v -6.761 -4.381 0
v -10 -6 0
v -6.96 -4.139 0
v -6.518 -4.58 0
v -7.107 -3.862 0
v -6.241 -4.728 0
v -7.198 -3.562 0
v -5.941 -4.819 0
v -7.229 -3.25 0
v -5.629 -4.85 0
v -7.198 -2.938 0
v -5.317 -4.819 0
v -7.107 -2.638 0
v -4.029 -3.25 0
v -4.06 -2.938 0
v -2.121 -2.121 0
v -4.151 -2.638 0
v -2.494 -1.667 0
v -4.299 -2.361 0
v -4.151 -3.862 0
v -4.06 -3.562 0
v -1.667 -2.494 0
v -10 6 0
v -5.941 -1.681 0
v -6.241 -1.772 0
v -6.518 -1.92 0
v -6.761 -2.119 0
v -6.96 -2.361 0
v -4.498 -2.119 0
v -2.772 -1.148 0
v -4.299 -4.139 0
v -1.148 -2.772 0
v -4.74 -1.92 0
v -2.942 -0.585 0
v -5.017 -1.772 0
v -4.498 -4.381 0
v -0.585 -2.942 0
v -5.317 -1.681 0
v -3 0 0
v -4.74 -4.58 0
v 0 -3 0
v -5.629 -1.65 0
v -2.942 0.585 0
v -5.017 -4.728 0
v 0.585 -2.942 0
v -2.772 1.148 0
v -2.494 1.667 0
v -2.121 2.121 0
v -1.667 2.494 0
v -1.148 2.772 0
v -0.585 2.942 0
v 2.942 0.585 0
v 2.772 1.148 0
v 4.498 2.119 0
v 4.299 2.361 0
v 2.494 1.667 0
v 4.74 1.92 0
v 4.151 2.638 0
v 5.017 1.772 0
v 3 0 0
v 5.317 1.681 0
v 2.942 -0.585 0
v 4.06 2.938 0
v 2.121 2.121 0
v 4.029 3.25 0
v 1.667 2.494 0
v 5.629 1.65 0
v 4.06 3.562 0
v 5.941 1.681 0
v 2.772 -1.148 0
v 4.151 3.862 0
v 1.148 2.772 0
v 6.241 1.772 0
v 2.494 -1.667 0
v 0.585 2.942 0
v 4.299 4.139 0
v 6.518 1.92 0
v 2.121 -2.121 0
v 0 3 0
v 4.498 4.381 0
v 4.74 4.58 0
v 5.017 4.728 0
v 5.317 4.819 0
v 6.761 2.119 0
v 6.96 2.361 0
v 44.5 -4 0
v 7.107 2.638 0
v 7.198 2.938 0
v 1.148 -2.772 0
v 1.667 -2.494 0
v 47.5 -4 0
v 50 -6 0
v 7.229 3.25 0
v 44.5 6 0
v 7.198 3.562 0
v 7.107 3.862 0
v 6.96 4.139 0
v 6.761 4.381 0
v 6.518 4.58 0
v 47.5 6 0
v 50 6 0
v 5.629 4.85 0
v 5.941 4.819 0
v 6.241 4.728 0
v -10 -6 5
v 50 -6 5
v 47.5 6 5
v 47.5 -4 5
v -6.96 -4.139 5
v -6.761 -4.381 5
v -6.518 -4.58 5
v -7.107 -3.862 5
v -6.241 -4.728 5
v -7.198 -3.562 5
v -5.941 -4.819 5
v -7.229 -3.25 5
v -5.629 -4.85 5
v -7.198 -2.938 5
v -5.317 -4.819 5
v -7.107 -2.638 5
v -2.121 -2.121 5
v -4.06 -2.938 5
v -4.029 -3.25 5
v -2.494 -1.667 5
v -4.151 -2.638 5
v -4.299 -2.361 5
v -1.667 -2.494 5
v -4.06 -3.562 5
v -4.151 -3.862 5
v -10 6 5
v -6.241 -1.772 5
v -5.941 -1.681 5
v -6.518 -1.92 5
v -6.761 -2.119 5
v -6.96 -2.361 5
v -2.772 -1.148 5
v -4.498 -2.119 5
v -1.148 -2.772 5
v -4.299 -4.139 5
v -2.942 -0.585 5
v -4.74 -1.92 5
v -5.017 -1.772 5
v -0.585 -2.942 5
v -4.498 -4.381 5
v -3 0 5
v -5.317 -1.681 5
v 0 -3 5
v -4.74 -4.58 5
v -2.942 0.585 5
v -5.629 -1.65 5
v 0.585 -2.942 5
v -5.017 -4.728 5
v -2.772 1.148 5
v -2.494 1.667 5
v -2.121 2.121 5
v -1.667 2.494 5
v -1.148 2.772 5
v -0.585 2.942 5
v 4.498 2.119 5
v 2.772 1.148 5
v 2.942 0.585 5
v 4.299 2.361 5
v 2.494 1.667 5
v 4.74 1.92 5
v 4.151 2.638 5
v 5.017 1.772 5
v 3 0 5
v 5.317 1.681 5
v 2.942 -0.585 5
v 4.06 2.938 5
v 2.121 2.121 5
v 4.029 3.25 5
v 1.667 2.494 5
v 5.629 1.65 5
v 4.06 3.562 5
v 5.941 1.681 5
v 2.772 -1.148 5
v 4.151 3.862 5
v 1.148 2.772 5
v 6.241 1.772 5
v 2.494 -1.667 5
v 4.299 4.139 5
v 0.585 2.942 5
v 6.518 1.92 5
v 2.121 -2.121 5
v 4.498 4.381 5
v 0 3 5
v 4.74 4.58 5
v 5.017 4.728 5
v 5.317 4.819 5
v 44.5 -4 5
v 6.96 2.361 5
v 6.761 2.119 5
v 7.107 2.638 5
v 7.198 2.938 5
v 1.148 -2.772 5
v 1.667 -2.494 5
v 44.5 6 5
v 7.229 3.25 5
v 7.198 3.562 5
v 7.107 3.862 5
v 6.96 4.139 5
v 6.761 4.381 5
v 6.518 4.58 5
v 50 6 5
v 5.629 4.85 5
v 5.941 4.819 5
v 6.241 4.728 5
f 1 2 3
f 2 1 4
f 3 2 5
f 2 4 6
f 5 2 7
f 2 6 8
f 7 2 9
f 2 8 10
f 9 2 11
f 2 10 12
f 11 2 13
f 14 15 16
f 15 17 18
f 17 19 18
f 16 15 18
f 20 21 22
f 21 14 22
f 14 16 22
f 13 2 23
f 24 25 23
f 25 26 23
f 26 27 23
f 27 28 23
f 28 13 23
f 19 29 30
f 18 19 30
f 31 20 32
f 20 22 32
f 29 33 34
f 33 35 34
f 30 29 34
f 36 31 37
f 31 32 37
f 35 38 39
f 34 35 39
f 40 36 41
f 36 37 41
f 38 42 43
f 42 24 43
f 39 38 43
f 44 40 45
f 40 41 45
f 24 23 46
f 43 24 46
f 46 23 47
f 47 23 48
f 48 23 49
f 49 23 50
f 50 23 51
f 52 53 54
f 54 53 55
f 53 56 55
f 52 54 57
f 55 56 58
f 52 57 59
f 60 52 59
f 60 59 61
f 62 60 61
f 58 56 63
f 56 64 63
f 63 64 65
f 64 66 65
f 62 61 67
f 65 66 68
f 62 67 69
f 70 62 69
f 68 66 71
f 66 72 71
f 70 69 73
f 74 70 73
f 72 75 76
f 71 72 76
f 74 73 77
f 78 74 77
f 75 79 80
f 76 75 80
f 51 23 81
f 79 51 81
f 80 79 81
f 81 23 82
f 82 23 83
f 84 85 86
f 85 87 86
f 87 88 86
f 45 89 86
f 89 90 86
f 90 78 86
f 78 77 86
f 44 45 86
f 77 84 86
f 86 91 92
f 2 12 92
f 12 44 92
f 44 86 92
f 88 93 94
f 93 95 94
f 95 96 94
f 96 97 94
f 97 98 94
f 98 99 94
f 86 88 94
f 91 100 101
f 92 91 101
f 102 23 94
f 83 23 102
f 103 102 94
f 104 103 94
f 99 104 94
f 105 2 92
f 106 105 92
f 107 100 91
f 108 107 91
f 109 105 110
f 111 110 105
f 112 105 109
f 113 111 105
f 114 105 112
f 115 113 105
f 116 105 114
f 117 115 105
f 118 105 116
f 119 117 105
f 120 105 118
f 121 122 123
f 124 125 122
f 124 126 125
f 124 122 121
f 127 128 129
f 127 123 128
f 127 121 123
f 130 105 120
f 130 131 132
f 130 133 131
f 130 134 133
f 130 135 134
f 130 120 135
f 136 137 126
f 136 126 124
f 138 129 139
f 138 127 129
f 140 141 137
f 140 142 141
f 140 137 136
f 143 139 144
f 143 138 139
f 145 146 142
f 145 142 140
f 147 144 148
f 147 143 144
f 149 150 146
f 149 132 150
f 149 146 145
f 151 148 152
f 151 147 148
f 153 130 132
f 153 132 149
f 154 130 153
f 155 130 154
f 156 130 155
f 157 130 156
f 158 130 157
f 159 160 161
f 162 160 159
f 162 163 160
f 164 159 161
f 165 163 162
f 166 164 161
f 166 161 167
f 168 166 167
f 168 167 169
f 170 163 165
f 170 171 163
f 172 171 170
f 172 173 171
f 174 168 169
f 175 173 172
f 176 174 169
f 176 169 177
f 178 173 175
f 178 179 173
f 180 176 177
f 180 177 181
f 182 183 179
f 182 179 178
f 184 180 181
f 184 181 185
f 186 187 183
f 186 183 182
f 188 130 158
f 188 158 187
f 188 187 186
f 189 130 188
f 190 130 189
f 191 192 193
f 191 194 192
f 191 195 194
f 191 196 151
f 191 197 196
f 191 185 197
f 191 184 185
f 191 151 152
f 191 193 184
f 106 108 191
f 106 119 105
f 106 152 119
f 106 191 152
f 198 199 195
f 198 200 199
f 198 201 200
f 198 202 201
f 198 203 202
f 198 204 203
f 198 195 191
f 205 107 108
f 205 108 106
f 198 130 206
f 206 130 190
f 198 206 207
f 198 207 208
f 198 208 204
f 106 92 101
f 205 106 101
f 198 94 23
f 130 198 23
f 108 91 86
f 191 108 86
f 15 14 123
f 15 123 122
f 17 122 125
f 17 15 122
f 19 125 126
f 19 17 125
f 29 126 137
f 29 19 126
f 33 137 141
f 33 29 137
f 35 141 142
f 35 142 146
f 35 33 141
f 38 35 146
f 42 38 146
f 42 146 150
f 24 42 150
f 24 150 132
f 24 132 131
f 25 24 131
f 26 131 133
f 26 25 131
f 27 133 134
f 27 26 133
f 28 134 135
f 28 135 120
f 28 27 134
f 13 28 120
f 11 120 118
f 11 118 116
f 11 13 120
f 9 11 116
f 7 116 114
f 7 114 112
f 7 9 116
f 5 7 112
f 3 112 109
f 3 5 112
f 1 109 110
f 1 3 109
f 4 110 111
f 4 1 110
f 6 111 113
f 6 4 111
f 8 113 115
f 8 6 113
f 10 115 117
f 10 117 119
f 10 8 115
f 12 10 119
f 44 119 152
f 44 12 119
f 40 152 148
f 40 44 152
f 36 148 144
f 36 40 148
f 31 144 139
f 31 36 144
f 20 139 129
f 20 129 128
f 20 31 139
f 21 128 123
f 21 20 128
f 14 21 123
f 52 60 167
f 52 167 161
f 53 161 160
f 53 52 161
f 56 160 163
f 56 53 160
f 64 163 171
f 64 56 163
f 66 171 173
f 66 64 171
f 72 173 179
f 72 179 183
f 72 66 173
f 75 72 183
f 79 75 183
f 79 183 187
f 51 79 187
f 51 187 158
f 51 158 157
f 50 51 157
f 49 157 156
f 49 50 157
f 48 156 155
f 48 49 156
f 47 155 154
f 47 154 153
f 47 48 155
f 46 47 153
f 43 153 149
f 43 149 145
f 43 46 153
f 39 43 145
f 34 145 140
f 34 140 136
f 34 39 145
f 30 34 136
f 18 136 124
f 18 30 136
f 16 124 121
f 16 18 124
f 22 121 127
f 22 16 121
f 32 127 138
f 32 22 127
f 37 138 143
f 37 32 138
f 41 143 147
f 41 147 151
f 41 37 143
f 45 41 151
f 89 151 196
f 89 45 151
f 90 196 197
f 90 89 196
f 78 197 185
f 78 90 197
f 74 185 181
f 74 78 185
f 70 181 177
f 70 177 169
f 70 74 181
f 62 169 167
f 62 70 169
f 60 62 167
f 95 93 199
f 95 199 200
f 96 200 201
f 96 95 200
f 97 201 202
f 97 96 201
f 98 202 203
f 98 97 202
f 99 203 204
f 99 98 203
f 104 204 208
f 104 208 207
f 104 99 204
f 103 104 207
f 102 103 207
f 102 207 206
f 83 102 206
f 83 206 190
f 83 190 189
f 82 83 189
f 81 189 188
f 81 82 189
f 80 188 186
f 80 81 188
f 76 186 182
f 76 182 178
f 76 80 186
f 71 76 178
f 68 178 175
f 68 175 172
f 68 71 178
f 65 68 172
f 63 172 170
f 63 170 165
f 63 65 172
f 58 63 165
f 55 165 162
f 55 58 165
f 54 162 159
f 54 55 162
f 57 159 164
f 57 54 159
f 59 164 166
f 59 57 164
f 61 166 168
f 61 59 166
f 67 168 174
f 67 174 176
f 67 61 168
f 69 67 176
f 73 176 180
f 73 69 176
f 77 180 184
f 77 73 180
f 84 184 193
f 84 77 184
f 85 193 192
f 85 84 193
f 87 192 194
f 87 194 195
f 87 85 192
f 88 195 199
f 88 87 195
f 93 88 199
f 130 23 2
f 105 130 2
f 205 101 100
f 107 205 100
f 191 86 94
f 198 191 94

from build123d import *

# Parameters (mm, degrees)
SKETCH_1_R      = 3
SKETCH_1_R_2    = 1.6
EXTRUDE_1_DEPTH = 5


with BuildPart() as part:
    # ｽｹｯﾁ1 → ﾎﾞｽ - 押し出し1 (new body)
    with BuildSketch(Plane.XY):
        Polygon((0, -6), (50, -6), (50, 6), (47.5, 6), (47.5, -4), (44.5, -4), (44.5, 6), (-10, 6), (-10, -6), align=None)
        Circle(SKETCH_1_R, mode=Mode.SUBTRACT)
        with Locations((5.629165125, 3.25)):
            Circle(SKETCH_1_R_2, mode=Mode.SUBTRACT)
        with Locations((-5.629165125, -3.25)):
            Circle(SKETCH_1_R_2, mode=Mode.SUBTRACT)
    extrude(amount=EXTRUDE_1_DEPTH)


solid = part.part
